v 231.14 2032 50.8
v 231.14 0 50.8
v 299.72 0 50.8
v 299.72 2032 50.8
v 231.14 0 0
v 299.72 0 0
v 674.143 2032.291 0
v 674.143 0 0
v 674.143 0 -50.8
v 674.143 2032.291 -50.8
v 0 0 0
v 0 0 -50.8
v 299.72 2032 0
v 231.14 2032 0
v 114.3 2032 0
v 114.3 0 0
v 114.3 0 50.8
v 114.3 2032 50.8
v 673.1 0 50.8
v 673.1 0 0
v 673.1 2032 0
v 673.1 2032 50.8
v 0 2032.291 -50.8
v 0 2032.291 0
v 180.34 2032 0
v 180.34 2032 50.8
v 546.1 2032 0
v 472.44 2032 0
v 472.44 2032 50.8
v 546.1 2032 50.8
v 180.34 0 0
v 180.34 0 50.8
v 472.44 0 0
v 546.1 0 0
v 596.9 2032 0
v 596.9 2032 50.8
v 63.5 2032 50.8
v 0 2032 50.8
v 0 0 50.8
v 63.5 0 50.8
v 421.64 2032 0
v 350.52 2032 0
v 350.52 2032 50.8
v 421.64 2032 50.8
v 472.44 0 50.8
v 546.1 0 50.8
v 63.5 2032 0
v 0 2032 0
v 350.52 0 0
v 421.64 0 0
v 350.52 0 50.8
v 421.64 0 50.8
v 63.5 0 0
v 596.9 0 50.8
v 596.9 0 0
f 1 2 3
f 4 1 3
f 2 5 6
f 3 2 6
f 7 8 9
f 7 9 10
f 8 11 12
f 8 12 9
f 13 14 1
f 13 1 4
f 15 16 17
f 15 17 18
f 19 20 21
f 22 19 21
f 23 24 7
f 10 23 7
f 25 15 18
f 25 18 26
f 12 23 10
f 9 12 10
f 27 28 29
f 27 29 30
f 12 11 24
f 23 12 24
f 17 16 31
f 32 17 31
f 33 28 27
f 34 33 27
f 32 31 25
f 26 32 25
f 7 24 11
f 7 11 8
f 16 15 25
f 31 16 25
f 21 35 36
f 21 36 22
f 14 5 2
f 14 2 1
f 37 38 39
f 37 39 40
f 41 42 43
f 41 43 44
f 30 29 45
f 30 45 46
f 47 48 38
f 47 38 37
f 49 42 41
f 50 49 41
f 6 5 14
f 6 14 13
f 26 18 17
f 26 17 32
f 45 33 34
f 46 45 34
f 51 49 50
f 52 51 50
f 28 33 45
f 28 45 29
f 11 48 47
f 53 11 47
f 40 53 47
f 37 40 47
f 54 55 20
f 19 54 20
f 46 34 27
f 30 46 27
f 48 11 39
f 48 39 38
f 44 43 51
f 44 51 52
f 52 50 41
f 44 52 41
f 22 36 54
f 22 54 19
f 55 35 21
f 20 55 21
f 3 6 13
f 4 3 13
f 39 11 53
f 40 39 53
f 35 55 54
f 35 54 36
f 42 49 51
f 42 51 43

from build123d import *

# Parameters (mm, degrees)
F0_W     = 63.5
F0_H     = 2032
F0_W_2   = 76.2
F0_W_3   = 73.66
F0_W_4   = 71.12
F0_W_5   = 68.58
F0_W_6   = 66.04
F1_DEPTH = 50.8
F2_W     = 674.143255
F2_H     = 2032.291412
F3_DEPTH = 50.8


with BuildPart() as f1:
    # F0 (on Top) → F1 (new body)
    with BuildSketch(Plane.XY):
        with Locations((31.75, 1016)):
            Rectangle(F0_W, F0_H)
        with Locations((635, 1016)):
            Rectangle(F0_W_2, F0_H)
        with Locations((509.27, 1016)):
            Rectangle(F0_W_3, F0_H)
        with Locations((386.08, 1016)):
            Rectangle(F0_W_4, F0_H)
        with Locations((265.43, 1016)):
            Rectangle(F0_W_5, F0_H)
        with Locations((147.32, 1016)):
            Rectangle(F0_W_6, F0_H)
    extrude(amount=F1_DEPTH)


with BuildPart() as f3:
    # F2 (on Top) → F3 (new body)
    with BuildSketch(Plane.XY):
        with Locations((337.071627, 1016.145706)):
            Rectangle(F2_W, F2_H)
    extrude(amount=-F3_DEPTH)


solid = Compound([f1.part, f3.part])
